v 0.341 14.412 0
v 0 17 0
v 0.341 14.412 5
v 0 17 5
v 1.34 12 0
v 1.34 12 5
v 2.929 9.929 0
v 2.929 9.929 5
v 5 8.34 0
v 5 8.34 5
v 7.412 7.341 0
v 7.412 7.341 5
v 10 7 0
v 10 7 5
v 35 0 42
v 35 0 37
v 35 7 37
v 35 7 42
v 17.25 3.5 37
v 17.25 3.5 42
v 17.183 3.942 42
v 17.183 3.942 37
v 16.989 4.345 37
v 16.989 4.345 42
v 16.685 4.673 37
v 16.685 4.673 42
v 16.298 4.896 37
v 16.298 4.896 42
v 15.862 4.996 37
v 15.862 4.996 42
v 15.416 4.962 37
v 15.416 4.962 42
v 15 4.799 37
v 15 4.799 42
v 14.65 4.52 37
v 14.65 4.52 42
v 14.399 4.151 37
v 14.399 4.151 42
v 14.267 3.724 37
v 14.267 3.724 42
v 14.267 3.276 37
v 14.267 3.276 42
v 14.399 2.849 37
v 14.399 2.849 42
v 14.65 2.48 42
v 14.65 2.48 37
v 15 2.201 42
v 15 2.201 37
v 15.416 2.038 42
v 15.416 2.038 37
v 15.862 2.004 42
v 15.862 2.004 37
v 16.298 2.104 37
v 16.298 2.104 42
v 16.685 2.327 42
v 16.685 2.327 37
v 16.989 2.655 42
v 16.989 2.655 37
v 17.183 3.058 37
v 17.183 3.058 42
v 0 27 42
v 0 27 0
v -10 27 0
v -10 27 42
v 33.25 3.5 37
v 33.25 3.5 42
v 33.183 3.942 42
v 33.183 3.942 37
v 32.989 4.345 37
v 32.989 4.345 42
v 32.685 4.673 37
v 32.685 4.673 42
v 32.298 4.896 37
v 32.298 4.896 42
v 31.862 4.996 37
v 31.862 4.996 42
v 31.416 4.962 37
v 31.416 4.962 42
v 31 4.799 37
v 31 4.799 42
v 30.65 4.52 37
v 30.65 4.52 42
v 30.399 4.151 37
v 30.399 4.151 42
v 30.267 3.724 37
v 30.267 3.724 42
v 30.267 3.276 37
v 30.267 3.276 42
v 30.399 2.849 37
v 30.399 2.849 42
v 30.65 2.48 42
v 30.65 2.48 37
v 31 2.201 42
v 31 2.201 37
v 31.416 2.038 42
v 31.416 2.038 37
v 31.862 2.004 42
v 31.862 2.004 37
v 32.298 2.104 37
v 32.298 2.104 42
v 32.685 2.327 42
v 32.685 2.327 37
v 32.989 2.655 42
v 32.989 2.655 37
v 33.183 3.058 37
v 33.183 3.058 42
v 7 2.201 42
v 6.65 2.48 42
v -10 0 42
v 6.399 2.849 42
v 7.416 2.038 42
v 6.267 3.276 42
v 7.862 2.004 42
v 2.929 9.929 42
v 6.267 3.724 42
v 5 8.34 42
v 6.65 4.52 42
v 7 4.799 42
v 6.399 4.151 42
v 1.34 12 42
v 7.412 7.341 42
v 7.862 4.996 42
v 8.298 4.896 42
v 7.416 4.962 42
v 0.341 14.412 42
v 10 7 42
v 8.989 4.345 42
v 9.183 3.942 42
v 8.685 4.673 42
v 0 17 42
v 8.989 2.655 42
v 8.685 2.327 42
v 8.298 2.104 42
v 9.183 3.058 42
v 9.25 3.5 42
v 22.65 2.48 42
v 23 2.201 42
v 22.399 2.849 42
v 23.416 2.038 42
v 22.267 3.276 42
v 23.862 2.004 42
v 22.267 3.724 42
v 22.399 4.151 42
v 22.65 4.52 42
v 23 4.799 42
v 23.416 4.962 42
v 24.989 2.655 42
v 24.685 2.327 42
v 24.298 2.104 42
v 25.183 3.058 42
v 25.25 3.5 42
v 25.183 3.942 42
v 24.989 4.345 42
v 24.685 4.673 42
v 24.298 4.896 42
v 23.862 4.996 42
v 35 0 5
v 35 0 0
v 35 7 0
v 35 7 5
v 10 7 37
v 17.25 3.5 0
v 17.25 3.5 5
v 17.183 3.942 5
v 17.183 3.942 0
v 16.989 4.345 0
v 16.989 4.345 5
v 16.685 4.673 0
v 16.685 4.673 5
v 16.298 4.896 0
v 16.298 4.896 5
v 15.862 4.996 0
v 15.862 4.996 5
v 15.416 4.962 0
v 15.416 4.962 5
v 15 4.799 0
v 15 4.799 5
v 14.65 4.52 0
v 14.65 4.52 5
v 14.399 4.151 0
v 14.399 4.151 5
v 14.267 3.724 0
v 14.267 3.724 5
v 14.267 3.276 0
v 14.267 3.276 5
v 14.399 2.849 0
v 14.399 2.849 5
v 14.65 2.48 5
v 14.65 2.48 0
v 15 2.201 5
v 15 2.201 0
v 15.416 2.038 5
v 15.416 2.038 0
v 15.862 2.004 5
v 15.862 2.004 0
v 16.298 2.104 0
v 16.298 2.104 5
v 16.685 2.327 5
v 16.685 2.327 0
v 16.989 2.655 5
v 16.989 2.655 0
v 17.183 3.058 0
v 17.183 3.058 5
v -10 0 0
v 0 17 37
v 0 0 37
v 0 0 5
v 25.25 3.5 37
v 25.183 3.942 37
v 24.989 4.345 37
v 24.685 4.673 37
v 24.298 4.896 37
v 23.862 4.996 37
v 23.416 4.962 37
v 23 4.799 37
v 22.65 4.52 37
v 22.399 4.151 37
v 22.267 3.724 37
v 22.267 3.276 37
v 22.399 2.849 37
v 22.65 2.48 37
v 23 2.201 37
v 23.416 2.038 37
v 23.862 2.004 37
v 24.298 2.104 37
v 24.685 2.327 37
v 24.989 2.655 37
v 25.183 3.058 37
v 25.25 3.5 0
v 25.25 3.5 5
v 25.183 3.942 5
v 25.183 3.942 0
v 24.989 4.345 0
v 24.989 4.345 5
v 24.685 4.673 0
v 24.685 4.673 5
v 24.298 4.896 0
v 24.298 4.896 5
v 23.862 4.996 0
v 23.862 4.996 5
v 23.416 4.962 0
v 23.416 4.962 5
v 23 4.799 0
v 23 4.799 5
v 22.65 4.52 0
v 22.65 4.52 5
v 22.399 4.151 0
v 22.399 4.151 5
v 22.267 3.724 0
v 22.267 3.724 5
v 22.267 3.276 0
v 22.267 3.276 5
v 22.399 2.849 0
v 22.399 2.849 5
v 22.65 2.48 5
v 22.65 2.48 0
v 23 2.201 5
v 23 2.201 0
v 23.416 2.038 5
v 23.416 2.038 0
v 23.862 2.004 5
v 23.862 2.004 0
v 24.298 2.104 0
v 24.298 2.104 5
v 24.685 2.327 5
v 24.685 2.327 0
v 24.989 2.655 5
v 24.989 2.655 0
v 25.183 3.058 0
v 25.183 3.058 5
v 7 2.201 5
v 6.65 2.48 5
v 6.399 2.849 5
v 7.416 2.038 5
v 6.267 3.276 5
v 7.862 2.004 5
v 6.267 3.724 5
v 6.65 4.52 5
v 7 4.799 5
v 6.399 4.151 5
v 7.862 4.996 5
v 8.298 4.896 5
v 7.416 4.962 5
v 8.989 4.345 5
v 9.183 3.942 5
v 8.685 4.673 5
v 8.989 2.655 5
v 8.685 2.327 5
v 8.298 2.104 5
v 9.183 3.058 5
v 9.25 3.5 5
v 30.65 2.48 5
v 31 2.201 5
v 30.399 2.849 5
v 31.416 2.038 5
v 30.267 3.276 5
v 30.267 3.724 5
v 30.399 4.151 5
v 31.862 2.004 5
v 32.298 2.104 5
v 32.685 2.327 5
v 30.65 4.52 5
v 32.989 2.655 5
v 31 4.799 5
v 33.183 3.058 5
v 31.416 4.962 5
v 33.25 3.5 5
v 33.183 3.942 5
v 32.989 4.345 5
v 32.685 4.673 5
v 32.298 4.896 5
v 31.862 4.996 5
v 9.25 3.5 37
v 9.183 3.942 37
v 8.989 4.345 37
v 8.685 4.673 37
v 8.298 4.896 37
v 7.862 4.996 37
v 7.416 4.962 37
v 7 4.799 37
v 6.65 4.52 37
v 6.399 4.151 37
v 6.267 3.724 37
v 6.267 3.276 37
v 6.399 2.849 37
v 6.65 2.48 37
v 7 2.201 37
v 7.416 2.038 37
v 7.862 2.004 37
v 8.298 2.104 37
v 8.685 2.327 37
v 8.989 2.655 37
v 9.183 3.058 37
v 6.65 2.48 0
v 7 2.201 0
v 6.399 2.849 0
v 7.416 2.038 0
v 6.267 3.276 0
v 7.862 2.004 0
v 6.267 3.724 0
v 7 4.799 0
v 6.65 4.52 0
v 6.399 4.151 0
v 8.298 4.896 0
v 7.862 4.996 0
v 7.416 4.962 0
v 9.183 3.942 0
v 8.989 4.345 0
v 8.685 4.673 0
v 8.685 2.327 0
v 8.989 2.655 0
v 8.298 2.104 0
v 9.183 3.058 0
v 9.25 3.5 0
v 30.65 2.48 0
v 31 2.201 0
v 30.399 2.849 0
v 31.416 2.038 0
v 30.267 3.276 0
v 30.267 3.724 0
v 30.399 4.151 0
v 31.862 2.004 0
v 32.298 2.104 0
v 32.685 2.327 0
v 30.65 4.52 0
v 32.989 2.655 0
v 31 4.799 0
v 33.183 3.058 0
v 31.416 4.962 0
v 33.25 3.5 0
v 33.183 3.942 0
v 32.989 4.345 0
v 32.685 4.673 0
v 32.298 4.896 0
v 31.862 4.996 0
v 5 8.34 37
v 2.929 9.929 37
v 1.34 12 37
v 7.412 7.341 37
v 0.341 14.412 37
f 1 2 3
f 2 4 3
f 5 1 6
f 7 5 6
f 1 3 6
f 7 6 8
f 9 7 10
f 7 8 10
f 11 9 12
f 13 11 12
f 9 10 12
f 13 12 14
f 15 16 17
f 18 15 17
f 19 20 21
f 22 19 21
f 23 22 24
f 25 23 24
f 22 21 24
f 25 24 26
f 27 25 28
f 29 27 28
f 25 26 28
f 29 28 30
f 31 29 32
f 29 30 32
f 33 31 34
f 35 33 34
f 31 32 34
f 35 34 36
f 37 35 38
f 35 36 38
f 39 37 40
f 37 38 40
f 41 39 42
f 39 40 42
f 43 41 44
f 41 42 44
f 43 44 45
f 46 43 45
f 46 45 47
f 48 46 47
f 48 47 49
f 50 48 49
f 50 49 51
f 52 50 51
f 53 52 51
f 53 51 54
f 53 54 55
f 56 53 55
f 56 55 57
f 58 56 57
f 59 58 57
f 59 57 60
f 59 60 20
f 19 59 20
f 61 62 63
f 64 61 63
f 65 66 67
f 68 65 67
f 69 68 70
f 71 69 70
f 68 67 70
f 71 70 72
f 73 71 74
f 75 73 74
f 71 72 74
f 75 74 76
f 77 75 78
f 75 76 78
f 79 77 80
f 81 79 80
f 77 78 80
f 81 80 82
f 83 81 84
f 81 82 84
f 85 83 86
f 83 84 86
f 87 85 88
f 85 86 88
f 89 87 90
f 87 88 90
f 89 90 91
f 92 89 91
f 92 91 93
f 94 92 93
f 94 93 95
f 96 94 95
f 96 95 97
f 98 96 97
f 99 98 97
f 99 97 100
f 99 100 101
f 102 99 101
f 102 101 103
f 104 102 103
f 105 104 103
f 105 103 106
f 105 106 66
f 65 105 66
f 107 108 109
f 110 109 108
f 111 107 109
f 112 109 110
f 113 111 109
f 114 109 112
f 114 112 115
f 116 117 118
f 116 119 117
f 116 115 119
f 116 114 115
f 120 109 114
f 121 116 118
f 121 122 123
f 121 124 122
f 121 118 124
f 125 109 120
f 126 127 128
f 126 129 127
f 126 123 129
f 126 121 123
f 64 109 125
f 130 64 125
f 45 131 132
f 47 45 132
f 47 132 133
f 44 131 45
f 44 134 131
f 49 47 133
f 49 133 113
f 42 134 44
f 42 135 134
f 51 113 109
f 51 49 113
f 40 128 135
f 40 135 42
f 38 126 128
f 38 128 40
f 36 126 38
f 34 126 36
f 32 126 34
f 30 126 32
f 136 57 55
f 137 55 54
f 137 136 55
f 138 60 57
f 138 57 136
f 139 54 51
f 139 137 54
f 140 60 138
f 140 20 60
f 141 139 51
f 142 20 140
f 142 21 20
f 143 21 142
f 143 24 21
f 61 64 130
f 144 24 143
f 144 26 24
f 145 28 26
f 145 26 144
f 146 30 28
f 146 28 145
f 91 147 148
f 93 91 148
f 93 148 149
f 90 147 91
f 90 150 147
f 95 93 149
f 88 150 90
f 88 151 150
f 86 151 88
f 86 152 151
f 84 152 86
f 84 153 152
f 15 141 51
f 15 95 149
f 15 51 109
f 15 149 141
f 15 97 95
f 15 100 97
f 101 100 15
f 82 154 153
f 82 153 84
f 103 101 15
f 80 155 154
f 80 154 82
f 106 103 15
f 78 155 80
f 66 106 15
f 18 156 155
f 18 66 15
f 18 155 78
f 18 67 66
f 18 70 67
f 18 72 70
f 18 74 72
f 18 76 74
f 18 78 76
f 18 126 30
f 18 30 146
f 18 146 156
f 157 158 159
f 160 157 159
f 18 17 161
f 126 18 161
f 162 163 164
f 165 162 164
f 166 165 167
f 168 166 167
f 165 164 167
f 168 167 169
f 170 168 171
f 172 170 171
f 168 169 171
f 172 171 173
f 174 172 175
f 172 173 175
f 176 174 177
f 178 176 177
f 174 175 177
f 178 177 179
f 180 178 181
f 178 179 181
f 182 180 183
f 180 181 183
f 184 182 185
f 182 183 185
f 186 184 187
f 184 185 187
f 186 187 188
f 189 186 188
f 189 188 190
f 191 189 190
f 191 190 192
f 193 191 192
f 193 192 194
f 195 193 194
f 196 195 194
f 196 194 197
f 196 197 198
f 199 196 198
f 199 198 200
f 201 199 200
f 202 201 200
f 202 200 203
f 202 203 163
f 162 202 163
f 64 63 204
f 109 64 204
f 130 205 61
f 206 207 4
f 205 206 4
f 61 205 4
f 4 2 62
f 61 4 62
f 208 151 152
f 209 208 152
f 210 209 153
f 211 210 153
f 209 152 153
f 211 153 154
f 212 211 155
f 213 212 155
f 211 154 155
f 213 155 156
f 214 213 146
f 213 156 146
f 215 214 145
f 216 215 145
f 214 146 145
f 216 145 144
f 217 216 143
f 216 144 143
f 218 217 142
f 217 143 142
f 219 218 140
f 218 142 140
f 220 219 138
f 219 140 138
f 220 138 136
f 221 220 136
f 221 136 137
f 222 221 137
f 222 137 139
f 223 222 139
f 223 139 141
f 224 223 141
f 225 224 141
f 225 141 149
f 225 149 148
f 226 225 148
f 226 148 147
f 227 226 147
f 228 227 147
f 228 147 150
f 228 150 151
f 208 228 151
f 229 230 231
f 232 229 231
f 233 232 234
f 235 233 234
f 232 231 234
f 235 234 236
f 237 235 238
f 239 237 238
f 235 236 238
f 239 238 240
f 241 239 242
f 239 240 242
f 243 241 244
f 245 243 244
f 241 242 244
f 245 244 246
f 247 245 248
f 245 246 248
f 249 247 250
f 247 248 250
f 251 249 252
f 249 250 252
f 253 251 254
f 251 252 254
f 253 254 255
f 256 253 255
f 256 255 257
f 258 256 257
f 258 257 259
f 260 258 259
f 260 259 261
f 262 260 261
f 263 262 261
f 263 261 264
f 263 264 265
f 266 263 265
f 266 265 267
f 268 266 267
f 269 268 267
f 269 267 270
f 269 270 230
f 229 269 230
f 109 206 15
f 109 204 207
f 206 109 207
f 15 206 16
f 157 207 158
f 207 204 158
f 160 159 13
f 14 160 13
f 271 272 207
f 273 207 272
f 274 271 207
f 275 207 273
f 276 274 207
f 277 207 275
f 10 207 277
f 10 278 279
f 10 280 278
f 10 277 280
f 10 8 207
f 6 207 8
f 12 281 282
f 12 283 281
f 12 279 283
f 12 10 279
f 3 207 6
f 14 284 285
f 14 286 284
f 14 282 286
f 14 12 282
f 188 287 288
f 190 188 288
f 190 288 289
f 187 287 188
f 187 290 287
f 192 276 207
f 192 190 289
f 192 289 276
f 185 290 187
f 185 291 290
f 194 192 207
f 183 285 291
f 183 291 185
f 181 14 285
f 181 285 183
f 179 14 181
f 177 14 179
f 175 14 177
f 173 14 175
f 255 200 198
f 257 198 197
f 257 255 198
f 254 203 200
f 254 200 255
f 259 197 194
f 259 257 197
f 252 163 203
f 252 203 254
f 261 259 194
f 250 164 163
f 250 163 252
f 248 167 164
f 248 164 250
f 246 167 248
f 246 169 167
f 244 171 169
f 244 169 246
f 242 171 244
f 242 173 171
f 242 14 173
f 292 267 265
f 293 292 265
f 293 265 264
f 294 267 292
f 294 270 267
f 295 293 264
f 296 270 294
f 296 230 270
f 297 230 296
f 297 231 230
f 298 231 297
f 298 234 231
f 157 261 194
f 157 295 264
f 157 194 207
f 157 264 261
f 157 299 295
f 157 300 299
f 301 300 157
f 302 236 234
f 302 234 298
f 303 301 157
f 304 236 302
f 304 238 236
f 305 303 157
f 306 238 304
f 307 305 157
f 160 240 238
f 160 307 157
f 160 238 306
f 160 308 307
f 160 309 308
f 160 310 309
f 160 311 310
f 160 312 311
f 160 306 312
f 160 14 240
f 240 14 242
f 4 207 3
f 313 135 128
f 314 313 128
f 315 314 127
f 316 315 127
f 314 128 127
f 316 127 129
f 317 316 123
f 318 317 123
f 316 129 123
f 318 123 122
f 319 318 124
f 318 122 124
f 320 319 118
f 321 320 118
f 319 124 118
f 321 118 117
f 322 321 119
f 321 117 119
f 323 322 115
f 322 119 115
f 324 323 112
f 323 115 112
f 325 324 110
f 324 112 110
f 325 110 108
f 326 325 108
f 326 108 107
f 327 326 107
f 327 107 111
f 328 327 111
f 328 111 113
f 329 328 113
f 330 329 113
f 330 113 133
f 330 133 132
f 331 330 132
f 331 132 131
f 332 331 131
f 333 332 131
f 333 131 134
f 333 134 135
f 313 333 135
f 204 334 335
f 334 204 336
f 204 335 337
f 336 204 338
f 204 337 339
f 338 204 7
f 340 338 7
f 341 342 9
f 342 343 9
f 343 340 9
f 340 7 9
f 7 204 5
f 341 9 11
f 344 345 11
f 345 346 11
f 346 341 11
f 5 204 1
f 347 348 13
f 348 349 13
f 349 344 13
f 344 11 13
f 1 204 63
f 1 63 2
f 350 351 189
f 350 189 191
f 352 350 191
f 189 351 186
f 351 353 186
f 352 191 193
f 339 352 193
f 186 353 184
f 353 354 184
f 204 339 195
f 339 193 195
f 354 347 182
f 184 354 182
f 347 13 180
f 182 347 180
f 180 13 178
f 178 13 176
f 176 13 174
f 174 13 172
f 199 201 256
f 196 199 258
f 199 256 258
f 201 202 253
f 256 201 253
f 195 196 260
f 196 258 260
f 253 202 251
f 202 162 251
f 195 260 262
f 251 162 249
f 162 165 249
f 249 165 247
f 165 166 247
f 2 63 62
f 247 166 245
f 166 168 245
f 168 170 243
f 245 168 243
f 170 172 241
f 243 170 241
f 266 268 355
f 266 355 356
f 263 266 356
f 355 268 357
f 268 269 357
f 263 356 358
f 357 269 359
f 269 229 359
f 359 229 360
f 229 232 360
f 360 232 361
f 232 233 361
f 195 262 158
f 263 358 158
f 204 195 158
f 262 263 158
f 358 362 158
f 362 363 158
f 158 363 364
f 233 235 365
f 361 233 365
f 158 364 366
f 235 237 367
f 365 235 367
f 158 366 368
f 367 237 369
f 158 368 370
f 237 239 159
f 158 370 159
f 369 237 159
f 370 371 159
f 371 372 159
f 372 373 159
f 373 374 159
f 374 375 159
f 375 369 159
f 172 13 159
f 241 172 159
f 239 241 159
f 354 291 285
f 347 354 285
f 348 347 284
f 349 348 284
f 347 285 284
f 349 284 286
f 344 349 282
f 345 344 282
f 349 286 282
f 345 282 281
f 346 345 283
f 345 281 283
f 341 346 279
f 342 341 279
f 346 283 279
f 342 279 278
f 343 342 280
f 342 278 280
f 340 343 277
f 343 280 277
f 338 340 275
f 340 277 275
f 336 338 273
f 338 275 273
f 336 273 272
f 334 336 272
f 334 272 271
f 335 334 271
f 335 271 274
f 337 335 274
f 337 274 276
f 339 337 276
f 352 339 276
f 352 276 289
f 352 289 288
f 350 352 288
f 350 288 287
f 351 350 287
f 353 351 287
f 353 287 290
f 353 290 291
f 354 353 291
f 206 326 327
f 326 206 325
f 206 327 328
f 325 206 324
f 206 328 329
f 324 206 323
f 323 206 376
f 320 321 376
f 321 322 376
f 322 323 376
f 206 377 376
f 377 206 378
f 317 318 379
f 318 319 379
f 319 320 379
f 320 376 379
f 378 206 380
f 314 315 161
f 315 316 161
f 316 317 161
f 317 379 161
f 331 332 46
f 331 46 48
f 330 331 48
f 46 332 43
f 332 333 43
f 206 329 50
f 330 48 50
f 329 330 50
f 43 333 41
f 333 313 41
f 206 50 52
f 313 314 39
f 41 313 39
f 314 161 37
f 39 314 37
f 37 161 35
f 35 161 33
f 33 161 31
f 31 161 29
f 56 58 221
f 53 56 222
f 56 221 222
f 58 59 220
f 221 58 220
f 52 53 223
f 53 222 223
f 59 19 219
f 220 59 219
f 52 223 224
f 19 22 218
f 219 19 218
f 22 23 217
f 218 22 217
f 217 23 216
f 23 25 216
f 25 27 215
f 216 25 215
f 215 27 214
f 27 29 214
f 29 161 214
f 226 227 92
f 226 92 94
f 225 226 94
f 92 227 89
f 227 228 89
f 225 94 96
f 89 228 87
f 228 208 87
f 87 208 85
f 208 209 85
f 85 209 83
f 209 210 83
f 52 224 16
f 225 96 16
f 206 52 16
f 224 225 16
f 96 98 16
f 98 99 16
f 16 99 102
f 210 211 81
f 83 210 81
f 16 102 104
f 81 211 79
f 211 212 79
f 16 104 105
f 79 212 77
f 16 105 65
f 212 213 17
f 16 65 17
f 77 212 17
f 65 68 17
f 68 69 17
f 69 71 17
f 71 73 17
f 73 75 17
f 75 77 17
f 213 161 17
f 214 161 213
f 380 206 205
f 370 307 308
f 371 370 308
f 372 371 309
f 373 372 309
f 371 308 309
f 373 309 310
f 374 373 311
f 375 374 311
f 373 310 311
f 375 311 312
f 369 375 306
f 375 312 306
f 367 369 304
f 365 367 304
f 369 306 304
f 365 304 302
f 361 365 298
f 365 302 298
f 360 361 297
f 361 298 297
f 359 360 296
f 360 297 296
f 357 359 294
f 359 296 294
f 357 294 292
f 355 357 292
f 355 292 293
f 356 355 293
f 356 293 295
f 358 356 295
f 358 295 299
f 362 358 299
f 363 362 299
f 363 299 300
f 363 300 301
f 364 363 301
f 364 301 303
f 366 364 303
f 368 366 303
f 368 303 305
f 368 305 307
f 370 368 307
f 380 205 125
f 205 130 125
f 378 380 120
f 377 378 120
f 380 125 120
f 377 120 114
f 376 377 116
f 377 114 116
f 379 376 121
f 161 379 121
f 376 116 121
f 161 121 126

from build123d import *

# Parameters (mm, degrees)
BOSS_EXTRU_1_DEPTH      = 42
ESQUISSE3_W             = 35
ESQUISSE3_H             = 32
ENL_V_MAT_EXTRU_2_DEPTH = 8
ESQUISSE2_R             = 1.5
ENL_V_MAT_EXTRU_3_DEPTH = 43
CONG_1_R                = 10


with BuildPart() as part:
    # Esquisse1 → Boss.-Extru.1 (new body)
    with BuildSketch(Plane.XY):
        Polygon((0, 7), (0, 27), (-10, 27), (-10, 0), (0, 0), (35, 0), (35, 7), align=None)
    extrude(amount=BOSS_EXTRU_1_DEPTH)

    # Esquisse3 → Enlèv. mat.-Extru.2 (cut, through all)
    with BuildSketch(Plane(origin=(0, 7, 0), x_dir=(1, 0, 0), z_dir=(0, 1, 0))):
        with Locations((17.5, -21)):
            Rectangle(ESQUISSE3_W, ESQUISSE3_H)
    extrude(amount=-ENL_V_MAT_EXTRU_2_DEPTH, mode=Mode.SUBTRACT)

    # Esquisse2 → Enlèv. mat.-Extru.3 (cut, through all)
    with BuildSketch(Plane.XY.offset(42)):
        with Locations((31.75, 3.5)):
            Circle(ESQUISSE2_R)
        with Locations((23.75, 3.5)):
            Circle(ESQUISSE2_R)
        with Locations((15.75, 3.5)):
            Circle(ESQUISSE2_R)
        with Locations((7.75, 3.5)):
            Circle(ESQUISSE2_R)
    extrude(amount=-ENL_V_MAT_EXTRU_3_DEPTH, mode=Mode.SUBTRACT)

    # Congé1
    cong_1_edges = [part.edges().sort_by_distance(p)[0] for p in [
        (0, 7, 39.5),
        (0, 7, 2.5),
    ]]
    fillet(cong_1_edges, radius=CONG_1_R)


solid = part.part
